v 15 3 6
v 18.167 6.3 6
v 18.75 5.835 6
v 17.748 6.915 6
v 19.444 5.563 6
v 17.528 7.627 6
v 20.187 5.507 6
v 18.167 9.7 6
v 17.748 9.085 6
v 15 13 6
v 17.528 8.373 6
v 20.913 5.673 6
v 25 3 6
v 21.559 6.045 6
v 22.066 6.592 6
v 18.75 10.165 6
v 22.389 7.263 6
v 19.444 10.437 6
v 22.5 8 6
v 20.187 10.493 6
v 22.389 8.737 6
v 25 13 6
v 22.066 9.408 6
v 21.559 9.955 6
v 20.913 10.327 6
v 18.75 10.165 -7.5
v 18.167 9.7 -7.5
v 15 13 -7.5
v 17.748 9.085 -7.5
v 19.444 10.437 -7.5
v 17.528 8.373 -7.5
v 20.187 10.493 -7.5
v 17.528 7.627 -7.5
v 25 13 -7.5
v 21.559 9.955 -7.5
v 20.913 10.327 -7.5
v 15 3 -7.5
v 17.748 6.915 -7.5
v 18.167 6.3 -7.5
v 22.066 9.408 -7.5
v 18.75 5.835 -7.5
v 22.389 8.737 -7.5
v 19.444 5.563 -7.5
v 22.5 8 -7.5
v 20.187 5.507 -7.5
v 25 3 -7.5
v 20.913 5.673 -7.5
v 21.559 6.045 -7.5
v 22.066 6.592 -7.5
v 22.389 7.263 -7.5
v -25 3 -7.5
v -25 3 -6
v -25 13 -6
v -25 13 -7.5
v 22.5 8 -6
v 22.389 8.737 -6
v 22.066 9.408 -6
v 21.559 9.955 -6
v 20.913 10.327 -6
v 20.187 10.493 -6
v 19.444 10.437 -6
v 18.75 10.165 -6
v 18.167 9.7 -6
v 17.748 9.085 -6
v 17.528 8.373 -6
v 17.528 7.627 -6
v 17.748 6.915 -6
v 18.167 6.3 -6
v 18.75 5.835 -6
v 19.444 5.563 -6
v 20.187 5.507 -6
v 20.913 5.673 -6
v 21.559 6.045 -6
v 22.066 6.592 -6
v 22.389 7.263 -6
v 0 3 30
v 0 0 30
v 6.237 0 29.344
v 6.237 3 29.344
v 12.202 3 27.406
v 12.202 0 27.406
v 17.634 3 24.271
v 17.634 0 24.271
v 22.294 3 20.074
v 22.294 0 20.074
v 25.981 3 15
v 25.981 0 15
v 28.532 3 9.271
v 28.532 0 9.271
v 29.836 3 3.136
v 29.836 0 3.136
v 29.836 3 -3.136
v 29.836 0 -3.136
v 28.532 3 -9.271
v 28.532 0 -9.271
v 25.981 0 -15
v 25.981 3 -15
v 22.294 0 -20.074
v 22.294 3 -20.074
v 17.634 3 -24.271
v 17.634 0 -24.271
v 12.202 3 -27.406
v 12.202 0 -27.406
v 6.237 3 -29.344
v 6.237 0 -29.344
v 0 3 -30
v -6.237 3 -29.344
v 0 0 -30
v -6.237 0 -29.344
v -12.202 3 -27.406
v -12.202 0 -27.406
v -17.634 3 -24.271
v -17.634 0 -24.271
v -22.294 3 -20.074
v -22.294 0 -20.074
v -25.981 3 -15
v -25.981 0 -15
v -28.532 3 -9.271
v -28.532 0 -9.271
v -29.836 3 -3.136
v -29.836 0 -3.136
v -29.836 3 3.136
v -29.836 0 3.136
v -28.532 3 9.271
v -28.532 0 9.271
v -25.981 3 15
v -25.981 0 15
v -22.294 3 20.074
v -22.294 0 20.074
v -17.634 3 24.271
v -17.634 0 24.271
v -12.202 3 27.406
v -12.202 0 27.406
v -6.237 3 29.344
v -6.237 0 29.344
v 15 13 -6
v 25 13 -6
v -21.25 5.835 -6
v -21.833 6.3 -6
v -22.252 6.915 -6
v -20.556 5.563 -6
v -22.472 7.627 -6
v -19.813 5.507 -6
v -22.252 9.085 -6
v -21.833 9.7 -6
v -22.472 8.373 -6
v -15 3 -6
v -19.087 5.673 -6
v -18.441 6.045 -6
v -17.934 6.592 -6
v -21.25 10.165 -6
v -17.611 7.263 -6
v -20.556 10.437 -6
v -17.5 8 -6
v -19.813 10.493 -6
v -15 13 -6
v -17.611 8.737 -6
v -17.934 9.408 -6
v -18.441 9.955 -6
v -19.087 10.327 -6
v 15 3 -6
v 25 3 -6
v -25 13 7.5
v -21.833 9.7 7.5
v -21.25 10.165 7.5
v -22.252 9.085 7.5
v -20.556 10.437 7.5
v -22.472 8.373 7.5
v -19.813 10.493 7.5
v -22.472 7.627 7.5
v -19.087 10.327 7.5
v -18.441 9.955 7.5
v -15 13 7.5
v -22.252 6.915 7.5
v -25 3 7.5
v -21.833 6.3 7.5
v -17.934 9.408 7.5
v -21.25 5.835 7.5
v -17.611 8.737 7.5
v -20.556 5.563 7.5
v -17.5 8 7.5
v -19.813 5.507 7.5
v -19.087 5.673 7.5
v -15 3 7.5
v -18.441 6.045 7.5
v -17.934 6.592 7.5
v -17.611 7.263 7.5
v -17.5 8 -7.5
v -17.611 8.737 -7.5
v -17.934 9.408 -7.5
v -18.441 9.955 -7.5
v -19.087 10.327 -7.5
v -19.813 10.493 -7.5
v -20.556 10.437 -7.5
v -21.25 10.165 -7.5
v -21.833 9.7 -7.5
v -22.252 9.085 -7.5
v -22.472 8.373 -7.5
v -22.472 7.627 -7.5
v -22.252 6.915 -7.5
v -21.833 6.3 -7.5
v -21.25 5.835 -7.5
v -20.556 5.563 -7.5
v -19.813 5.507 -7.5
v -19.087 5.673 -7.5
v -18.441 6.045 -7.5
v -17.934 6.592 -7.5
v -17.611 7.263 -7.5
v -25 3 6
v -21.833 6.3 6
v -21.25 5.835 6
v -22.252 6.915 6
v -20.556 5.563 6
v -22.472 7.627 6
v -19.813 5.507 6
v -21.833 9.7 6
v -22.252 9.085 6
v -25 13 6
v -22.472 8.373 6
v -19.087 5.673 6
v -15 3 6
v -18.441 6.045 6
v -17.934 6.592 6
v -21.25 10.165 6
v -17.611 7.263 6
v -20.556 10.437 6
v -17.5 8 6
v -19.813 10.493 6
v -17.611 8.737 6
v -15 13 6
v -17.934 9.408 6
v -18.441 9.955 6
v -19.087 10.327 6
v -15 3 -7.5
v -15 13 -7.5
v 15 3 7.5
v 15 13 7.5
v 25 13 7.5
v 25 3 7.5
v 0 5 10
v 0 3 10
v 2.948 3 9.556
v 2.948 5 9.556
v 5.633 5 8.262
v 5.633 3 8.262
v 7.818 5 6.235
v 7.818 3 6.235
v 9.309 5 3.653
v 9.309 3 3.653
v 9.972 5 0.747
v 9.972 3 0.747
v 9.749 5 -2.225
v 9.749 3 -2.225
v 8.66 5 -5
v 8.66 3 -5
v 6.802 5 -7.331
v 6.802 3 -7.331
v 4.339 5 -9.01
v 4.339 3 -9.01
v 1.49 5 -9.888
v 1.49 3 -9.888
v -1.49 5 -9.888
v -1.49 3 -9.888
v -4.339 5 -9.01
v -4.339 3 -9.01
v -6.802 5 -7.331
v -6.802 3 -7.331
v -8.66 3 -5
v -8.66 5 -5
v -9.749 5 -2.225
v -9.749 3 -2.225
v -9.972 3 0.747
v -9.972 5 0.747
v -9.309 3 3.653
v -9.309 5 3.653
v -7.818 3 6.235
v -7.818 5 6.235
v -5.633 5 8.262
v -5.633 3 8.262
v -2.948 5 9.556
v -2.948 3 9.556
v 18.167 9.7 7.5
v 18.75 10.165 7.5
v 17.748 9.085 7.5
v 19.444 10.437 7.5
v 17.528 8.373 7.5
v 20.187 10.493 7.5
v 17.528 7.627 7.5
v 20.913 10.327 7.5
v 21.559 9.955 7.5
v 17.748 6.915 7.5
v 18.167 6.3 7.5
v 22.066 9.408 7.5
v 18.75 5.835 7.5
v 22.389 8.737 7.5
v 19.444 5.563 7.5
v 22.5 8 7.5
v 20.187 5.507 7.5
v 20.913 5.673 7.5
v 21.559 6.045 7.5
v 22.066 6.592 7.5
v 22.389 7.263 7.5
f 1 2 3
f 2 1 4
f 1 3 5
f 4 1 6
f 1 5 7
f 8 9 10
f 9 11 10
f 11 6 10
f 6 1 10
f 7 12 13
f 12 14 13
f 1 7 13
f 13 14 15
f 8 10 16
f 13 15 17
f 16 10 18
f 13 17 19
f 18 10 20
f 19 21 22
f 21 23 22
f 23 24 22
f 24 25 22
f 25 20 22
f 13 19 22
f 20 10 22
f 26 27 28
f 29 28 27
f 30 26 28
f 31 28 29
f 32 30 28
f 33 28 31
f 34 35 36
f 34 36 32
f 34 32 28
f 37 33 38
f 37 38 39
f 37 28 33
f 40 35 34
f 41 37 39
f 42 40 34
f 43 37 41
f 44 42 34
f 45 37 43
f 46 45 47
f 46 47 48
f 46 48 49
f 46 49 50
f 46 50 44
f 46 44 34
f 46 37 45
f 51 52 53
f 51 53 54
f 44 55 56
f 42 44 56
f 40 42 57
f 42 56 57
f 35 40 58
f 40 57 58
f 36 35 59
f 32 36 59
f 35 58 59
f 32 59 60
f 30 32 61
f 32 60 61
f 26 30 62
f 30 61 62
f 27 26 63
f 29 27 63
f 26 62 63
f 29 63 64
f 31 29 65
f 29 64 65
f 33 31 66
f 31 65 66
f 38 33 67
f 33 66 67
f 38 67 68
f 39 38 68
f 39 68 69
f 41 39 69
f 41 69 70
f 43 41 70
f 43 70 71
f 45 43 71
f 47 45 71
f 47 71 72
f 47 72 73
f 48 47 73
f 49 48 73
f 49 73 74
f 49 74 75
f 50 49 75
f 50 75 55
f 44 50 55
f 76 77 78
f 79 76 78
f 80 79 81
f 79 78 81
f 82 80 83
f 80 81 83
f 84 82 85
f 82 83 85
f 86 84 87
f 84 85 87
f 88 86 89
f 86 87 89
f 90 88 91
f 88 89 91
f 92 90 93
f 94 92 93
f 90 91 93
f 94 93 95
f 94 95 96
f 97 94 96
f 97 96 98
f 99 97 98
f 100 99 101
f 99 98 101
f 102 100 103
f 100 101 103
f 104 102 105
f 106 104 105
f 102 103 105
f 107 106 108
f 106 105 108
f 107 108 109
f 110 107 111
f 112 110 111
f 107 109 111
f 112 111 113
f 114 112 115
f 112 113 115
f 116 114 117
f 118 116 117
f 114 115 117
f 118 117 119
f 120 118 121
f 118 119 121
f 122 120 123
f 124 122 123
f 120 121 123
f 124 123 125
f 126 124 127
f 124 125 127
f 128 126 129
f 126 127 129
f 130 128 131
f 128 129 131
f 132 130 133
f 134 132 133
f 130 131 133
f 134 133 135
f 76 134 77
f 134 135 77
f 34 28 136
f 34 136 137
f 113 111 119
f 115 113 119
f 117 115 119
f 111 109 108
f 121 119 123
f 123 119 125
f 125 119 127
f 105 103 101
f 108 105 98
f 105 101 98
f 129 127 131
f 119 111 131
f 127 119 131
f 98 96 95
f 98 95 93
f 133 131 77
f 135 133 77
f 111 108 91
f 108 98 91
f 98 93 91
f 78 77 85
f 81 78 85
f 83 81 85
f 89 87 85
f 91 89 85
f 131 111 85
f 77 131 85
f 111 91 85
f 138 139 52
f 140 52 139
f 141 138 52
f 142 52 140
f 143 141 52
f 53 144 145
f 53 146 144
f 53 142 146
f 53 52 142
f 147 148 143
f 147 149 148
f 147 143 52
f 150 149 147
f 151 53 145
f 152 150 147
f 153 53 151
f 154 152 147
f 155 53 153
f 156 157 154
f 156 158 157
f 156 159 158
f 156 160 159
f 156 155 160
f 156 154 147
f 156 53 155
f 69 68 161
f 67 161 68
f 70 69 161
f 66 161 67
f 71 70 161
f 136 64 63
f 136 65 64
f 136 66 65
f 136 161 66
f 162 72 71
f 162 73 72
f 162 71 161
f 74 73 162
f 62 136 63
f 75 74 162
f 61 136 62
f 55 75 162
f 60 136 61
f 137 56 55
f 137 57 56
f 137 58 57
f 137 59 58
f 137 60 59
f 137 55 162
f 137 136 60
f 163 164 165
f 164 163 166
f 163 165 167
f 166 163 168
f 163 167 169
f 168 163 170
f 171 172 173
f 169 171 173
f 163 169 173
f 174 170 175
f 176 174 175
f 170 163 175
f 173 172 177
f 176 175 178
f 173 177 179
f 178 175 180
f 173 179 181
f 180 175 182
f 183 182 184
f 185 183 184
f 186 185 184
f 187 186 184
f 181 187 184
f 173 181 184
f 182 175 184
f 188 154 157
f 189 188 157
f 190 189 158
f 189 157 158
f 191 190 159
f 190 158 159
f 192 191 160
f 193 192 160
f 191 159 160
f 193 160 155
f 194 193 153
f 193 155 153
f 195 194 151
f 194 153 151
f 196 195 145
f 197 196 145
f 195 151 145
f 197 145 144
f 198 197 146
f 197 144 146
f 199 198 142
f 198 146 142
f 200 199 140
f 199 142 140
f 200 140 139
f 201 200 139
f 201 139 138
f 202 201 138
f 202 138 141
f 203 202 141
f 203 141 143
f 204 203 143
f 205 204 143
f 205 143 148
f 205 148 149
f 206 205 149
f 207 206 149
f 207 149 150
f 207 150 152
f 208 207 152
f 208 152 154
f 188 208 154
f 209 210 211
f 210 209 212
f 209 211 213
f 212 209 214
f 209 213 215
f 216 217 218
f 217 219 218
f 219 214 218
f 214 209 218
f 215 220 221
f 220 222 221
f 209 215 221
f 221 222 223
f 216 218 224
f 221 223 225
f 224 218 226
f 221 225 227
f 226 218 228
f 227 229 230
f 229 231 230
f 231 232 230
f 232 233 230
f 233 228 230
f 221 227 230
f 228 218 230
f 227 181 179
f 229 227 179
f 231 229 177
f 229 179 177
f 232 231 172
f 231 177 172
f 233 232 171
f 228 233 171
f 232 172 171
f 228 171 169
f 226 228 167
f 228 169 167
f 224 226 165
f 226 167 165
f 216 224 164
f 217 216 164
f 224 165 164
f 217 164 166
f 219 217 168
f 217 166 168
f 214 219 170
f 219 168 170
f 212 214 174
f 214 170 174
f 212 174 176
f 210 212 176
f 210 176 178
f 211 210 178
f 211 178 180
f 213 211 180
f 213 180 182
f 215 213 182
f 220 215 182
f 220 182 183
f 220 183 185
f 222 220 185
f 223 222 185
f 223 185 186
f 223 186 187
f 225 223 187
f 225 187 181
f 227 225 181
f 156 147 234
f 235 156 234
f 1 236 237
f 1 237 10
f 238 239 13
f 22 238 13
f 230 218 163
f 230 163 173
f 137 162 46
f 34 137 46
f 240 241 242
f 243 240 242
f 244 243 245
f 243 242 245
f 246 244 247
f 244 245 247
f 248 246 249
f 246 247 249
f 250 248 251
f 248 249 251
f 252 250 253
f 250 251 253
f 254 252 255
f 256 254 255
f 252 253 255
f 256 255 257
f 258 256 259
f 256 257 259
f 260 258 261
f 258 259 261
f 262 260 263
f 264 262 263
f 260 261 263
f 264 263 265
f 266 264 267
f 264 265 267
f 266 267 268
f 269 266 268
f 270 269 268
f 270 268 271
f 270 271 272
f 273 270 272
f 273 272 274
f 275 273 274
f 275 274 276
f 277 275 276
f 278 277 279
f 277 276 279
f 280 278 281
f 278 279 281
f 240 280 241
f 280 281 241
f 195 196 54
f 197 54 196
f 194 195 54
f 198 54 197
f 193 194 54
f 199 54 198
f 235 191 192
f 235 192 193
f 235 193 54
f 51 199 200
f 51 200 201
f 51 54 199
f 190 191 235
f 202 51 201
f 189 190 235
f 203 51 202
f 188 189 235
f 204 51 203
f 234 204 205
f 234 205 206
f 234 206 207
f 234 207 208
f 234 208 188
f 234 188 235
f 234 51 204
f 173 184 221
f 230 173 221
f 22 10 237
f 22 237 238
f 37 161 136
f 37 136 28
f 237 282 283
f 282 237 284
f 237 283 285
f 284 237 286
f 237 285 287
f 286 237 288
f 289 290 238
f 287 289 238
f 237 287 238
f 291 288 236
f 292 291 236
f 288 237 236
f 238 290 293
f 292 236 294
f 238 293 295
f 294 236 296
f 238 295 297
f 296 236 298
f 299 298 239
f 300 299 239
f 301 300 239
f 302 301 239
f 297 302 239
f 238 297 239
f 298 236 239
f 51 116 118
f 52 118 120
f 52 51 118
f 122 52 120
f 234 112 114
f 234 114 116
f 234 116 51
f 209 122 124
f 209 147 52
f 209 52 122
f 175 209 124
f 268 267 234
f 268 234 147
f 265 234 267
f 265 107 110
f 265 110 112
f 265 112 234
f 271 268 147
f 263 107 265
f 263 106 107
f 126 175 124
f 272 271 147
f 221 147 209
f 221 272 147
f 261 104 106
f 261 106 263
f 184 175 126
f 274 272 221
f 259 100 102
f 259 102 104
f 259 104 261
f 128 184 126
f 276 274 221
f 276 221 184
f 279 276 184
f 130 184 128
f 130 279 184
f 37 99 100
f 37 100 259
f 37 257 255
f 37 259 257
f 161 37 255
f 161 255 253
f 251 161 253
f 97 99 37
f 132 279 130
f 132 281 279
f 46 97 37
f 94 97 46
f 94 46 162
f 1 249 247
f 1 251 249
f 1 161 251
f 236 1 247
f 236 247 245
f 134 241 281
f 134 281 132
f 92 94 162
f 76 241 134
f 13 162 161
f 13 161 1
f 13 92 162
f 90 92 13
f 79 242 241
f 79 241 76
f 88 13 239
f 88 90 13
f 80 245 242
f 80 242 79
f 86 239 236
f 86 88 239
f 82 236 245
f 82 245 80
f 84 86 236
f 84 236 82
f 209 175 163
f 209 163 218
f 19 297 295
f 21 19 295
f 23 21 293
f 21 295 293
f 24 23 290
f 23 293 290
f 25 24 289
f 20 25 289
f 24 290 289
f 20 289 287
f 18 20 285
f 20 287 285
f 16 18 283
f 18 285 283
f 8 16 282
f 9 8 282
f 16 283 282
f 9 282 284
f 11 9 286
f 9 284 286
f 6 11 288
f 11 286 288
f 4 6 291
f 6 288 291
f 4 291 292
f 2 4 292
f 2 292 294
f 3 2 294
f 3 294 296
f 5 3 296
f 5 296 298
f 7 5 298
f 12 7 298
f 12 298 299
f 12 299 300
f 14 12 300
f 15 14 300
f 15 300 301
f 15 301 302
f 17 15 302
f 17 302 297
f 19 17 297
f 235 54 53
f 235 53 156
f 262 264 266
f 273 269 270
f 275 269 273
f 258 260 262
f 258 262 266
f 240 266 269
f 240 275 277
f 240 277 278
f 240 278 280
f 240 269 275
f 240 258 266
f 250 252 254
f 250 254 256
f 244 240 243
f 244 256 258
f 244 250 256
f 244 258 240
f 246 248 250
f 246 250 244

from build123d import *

# Parameters (mm, degrees)
SKETCH1_R           = 30
BOSS_EXTRUDE1_DEPTH = 3
SKETCH2_R           = 10
BOSS_EXTRUDE2_DEPTH = 2
SKETCH3_W           = 10
SKETCH3_H           = 15
BOSS_EXTRUDE3_DEPTH = 10
CUT_EXTRUDE1_START  = -1.5
SKETCH4_W           = 10
SKETCH4_H           = 10
CUT_EXTRUDE1_DEPTH  = 12
SKETCH5_R           = 2.5
CUT_EXTRUDE2_DEPTH  = 50.751884386


with BuildPart() as part:
    # Sketch1 → Boss-Extrude1 (new body)
    with BuildSketch(Plane(origin=(0, 0, 0), x_dir=(1, 0, 0), z_dir=(0, 1, 0))):
        with Locations(Location((0, 0, 0), (0, 0, 270))):
            Circle(SKETCH1_R)
    extrude(amount=BOSS_EXTRUDE1_DEPTH)

    # Sketch2 → Boss-Extrude2 (add)
    with BuildSketch(Plane(origin=(0, 3, 0), x_dir=(1, 0, 0), z_dir=(0, 1, 0))):
        with Locations(Location((0, 0, 0), (0, 0, 270))):
            Circle(SKETCH2_R)
    extrude(amount=BOSS_EXTRUDE2_DEPTH)

    # Sketch3 → Boss-Extrude3 (add)
    with BuildSketch(Plane(origin=(0, 3, 0), x_dir=(1, 0, 0), z_dir=(0, 1, 0))):
        with Locations((-20, 0)):
            Rectangle(SKETCH3_W, SKETCH3_H)
        with Locations((20, 0)):
            Rectangle(SKETCH3_W, SKETCH3_H)
    extrude(amount=BOSS_EXTRUDE3_DEPTH)

    # Sketch4 → Cut-Extrude1 (cut)
    with BuildSketch(Plane.XY.offset(7.5).offset(CUT_EXTRUDE1_START)):
        with Locations((-20, 8)):
            Rectangle(SKETCH4_W, SKETCH4_H)
        with Locations((20, 8)):
            Rectangle(SKETCH4_W, SKETCH4_H)
    extrude(amount=-CUT_EXTRUDE1_DEPTH, mode=Mode.SUBTRACT)

    # Sketch5 → Cut-Extrude2 (cut, through all)
    with BuildSketch(Plane.XY.offset(7.5)):
        with Locations((20, 8)):
            Circle(SKETCH5_R)
        with Locations((-20, 8)):
            Circle(SKETCH5_R)
    extrude(amount=-CUT_EXTRUDE2_DEPTH, mode=Mode.SUBTRACT)


solid = part.part
